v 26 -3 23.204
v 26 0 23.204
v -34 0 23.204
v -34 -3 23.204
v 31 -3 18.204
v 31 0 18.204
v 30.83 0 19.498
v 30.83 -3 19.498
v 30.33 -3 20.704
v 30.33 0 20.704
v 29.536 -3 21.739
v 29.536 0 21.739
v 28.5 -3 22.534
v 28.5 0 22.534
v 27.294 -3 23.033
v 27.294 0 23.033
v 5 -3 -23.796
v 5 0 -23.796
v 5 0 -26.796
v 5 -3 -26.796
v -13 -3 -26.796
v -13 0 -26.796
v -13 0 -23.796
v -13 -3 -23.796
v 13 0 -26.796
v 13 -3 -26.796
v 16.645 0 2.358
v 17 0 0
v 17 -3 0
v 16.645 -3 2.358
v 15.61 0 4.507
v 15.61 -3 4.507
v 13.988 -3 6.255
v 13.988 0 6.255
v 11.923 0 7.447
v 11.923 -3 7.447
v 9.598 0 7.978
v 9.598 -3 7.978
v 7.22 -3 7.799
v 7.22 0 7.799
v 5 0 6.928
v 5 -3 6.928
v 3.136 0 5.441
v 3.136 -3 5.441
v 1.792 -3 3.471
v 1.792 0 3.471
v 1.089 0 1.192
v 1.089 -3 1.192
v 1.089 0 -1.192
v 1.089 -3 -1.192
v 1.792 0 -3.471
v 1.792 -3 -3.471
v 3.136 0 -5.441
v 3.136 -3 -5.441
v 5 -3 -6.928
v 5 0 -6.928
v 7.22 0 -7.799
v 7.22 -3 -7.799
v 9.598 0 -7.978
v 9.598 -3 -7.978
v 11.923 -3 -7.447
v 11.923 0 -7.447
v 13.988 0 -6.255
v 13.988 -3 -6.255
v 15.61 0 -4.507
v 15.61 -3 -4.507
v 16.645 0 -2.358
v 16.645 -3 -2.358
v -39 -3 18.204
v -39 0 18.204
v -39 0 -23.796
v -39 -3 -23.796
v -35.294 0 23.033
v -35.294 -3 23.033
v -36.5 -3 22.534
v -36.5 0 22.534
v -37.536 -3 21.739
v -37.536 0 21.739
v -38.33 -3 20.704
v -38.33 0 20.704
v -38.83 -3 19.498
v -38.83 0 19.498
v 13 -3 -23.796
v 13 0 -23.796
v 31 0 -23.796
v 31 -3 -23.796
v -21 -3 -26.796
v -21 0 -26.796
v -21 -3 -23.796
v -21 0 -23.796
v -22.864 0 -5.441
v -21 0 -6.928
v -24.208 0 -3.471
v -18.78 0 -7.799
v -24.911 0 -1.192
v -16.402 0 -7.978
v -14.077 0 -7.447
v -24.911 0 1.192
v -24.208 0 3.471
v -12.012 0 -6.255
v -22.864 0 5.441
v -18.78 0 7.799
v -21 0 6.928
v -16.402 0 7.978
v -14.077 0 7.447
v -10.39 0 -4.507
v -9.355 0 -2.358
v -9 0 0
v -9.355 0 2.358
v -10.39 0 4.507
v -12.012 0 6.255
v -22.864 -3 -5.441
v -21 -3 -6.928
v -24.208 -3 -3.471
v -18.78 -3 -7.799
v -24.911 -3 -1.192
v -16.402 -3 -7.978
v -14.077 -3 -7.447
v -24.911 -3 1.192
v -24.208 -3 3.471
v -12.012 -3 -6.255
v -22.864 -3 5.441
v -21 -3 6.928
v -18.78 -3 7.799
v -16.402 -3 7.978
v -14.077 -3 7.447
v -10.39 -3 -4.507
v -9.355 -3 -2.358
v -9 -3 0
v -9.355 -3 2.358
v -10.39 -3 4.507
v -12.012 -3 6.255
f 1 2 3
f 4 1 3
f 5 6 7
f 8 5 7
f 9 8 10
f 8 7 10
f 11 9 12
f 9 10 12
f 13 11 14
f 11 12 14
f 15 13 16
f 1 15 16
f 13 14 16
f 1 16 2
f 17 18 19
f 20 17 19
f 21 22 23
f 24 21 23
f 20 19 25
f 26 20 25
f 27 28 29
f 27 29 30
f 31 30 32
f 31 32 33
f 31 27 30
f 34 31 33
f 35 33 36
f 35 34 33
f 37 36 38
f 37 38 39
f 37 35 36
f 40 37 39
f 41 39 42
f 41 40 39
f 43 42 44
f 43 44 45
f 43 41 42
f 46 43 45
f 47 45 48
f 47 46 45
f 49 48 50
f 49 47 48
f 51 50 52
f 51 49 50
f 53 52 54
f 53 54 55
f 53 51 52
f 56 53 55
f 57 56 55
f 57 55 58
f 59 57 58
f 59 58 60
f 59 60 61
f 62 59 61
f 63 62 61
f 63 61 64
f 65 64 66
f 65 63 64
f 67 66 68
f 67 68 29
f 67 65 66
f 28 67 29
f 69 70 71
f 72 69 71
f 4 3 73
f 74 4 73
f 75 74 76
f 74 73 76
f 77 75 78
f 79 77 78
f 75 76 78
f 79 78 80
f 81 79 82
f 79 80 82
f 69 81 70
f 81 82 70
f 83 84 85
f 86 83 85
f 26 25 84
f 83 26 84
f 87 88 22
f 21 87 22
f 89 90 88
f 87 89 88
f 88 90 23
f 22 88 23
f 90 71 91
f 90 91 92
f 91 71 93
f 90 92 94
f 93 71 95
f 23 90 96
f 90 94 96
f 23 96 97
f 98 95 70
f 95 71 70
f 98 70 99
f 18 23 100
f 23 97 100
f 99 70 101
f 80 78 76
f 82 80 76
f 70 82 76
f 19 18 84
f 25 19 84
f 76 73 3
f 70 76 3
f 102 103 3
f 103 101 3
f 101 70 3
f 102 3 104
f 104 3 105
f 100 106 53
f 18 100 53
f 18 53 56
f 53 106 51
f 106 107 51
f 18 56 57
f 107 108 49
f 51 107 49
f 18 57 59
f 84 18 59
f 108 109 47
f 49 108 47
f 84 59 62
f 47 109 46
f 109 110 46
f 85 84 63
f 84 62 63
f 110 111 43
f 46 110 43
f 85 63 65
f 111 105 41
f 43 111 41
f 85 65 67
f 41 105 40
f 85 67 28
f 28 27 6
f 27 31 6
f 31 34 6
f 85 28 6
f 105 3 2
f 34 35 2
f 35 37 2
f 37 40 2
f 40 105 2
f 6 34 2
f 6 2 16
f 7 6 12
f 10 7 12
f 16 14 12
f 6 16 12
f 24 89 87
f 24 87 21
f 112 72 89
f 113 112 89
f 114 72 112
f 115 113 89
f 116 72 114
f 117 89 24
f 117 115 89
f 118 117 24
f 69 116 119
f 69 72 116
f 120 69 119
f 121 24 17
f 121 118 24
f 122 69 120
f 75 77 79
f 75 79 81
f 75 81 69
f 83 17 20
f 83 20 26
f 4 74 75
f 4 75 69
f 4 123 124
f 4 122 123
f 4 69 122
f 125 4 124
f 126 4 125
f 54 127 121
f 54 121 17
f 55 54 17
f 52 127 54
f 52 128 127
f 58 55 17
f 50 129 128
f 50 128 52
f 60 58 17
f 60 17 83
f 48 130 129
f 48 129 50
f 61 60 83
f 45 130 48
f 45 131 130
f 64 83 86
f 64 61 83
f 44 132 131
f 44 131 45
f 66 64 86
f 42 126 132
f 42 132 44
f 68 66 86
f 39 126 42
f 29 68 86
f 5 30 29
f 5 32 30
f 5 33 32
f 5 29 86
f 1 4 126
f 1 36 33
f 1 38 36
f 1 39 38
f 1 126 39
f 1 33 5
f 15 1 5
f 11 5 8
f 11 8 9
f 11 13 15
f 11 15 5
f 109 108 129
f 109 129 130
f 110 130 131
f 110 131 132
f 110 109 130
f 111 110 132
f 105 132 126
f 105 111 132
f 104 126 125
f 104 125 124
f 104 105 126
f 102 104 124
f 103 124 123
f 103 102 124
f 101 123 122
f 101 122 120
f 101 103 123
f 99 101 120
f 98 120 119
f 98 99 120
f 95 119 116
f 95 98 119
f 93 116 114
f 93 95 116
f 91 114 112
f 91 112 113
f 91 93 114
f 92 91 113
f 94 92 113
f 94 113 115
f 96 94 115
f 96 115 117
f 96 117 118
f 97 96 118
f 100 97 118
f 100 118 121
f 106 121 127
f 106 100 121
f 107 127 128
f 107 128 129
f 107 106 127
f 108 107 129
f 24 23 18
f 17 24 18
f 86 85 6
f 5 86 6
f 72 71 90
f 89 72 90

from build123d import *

# Parameters (mm, degrees)
F0_R     = 8
F1_DEPTH = 3
F2_DEPTH = 25


with BuildPart() as f1:
    # F0 (on Front) → F1 (new body)
    with BuildSketch(Plane.XZ):
        with BuildLine():
            Line((26.000001, 23.203813), (-33.999999, 23.203813))
            ThreePointArc((-33.999999, 23.203813), (-37.535533, 21.739347), (-38.999999, 18.203813))
            Line((-38.999999, 18.203813), (-38.999999, -23.796187))
            Line((-38.999999, -23.796187), (-20.999999, -23.796187))
            Line((-20.999999, -23.796187), (-20.999999, -26.796187))
            Line((-20.999999, -26.796187), (-12.999999, -26.796187))
            Line((-12.999999, -26.796187), (-12.999999, -23.796187))
            Line((-12.999999, -23.796187), (5.000001, -23.796187))
            Line((5.000001, -23.796187), (5.000001, -26.796187))
            Line((5.000001, -26.796187), (13.000001, -26.796187))
            Line((13.000001, -26.796187), (13.000001, -23.796187))
            Line((13.000001, -23.796187), (31.000001, -23.796187))
            Line((31.000001, -23.796187), (31.000001, 18.203813))
            ThreePointArc((31.000001, 18.203813), (29.535535, 21.739347), (26.000001, 23.203813))
        make_face()
        with Locations((-17, 0)):
            Circle(F0_R, mode=Mode.SUBTRACT)
        with Locations((9, 0)):
            Circle(F0_R, mode=Mode.SUBTRACT)
    extrude(amount=F1_DEPTH)


with BuildPart() as f2:
    # F0 (on Front) → F2 (new body)
    with BuildSketch(Plane.XZ):
        with BuildLine():
            Line((26.000001, 23.203813), (-33.999999, 23.203813))
            ThreePointArc((-33.999999, 23.203813), (-37.535533, 21.739347), (-38.999999, 18.203813))
            Line((-38.999999, 18.203813), (-38.999999, -23.796187))
            Line((-38.999999, -23.796187), (-20.999999, -23.796187))
            Line((-20.999999, -23.796187), (-20.999999, -26.796187))
            Line((-20.999999, -26.796187), (-12.999999, -26.796187))
            Line((-12.999999, -26.796187), (-12.999999, -23.796187))
            Line((-12.999999, -23.796187), (5.000001, -23.796187))
            Line((5.000001, -23.796187), (5.000001, -26.796187))
            Line((5.000001, -26.796187), (13.000001, -26.796187))
            Line((13.000001, -26.796187), (13.000001, -23.796187))
            Line((13.000001, -23.796187), (31.000001, -23.796187))
            Line((31.000001, -23.796187), (31.000001, 18.203813))
            ThreePointArc((31.000001, 18.203813), (29.535535, 21.739347), (26.000001, 23.203813))
        make_face()
        with Locations((-17, 0)):
            Circle(F0_R, mode=Mode.SUBTRACT)
        with Locations((9, 0)):
            Circle(F0_R, mode=Mode.SUBTRACT)
    extrude(amount=F2_DEPTH)


solid = f1.part
